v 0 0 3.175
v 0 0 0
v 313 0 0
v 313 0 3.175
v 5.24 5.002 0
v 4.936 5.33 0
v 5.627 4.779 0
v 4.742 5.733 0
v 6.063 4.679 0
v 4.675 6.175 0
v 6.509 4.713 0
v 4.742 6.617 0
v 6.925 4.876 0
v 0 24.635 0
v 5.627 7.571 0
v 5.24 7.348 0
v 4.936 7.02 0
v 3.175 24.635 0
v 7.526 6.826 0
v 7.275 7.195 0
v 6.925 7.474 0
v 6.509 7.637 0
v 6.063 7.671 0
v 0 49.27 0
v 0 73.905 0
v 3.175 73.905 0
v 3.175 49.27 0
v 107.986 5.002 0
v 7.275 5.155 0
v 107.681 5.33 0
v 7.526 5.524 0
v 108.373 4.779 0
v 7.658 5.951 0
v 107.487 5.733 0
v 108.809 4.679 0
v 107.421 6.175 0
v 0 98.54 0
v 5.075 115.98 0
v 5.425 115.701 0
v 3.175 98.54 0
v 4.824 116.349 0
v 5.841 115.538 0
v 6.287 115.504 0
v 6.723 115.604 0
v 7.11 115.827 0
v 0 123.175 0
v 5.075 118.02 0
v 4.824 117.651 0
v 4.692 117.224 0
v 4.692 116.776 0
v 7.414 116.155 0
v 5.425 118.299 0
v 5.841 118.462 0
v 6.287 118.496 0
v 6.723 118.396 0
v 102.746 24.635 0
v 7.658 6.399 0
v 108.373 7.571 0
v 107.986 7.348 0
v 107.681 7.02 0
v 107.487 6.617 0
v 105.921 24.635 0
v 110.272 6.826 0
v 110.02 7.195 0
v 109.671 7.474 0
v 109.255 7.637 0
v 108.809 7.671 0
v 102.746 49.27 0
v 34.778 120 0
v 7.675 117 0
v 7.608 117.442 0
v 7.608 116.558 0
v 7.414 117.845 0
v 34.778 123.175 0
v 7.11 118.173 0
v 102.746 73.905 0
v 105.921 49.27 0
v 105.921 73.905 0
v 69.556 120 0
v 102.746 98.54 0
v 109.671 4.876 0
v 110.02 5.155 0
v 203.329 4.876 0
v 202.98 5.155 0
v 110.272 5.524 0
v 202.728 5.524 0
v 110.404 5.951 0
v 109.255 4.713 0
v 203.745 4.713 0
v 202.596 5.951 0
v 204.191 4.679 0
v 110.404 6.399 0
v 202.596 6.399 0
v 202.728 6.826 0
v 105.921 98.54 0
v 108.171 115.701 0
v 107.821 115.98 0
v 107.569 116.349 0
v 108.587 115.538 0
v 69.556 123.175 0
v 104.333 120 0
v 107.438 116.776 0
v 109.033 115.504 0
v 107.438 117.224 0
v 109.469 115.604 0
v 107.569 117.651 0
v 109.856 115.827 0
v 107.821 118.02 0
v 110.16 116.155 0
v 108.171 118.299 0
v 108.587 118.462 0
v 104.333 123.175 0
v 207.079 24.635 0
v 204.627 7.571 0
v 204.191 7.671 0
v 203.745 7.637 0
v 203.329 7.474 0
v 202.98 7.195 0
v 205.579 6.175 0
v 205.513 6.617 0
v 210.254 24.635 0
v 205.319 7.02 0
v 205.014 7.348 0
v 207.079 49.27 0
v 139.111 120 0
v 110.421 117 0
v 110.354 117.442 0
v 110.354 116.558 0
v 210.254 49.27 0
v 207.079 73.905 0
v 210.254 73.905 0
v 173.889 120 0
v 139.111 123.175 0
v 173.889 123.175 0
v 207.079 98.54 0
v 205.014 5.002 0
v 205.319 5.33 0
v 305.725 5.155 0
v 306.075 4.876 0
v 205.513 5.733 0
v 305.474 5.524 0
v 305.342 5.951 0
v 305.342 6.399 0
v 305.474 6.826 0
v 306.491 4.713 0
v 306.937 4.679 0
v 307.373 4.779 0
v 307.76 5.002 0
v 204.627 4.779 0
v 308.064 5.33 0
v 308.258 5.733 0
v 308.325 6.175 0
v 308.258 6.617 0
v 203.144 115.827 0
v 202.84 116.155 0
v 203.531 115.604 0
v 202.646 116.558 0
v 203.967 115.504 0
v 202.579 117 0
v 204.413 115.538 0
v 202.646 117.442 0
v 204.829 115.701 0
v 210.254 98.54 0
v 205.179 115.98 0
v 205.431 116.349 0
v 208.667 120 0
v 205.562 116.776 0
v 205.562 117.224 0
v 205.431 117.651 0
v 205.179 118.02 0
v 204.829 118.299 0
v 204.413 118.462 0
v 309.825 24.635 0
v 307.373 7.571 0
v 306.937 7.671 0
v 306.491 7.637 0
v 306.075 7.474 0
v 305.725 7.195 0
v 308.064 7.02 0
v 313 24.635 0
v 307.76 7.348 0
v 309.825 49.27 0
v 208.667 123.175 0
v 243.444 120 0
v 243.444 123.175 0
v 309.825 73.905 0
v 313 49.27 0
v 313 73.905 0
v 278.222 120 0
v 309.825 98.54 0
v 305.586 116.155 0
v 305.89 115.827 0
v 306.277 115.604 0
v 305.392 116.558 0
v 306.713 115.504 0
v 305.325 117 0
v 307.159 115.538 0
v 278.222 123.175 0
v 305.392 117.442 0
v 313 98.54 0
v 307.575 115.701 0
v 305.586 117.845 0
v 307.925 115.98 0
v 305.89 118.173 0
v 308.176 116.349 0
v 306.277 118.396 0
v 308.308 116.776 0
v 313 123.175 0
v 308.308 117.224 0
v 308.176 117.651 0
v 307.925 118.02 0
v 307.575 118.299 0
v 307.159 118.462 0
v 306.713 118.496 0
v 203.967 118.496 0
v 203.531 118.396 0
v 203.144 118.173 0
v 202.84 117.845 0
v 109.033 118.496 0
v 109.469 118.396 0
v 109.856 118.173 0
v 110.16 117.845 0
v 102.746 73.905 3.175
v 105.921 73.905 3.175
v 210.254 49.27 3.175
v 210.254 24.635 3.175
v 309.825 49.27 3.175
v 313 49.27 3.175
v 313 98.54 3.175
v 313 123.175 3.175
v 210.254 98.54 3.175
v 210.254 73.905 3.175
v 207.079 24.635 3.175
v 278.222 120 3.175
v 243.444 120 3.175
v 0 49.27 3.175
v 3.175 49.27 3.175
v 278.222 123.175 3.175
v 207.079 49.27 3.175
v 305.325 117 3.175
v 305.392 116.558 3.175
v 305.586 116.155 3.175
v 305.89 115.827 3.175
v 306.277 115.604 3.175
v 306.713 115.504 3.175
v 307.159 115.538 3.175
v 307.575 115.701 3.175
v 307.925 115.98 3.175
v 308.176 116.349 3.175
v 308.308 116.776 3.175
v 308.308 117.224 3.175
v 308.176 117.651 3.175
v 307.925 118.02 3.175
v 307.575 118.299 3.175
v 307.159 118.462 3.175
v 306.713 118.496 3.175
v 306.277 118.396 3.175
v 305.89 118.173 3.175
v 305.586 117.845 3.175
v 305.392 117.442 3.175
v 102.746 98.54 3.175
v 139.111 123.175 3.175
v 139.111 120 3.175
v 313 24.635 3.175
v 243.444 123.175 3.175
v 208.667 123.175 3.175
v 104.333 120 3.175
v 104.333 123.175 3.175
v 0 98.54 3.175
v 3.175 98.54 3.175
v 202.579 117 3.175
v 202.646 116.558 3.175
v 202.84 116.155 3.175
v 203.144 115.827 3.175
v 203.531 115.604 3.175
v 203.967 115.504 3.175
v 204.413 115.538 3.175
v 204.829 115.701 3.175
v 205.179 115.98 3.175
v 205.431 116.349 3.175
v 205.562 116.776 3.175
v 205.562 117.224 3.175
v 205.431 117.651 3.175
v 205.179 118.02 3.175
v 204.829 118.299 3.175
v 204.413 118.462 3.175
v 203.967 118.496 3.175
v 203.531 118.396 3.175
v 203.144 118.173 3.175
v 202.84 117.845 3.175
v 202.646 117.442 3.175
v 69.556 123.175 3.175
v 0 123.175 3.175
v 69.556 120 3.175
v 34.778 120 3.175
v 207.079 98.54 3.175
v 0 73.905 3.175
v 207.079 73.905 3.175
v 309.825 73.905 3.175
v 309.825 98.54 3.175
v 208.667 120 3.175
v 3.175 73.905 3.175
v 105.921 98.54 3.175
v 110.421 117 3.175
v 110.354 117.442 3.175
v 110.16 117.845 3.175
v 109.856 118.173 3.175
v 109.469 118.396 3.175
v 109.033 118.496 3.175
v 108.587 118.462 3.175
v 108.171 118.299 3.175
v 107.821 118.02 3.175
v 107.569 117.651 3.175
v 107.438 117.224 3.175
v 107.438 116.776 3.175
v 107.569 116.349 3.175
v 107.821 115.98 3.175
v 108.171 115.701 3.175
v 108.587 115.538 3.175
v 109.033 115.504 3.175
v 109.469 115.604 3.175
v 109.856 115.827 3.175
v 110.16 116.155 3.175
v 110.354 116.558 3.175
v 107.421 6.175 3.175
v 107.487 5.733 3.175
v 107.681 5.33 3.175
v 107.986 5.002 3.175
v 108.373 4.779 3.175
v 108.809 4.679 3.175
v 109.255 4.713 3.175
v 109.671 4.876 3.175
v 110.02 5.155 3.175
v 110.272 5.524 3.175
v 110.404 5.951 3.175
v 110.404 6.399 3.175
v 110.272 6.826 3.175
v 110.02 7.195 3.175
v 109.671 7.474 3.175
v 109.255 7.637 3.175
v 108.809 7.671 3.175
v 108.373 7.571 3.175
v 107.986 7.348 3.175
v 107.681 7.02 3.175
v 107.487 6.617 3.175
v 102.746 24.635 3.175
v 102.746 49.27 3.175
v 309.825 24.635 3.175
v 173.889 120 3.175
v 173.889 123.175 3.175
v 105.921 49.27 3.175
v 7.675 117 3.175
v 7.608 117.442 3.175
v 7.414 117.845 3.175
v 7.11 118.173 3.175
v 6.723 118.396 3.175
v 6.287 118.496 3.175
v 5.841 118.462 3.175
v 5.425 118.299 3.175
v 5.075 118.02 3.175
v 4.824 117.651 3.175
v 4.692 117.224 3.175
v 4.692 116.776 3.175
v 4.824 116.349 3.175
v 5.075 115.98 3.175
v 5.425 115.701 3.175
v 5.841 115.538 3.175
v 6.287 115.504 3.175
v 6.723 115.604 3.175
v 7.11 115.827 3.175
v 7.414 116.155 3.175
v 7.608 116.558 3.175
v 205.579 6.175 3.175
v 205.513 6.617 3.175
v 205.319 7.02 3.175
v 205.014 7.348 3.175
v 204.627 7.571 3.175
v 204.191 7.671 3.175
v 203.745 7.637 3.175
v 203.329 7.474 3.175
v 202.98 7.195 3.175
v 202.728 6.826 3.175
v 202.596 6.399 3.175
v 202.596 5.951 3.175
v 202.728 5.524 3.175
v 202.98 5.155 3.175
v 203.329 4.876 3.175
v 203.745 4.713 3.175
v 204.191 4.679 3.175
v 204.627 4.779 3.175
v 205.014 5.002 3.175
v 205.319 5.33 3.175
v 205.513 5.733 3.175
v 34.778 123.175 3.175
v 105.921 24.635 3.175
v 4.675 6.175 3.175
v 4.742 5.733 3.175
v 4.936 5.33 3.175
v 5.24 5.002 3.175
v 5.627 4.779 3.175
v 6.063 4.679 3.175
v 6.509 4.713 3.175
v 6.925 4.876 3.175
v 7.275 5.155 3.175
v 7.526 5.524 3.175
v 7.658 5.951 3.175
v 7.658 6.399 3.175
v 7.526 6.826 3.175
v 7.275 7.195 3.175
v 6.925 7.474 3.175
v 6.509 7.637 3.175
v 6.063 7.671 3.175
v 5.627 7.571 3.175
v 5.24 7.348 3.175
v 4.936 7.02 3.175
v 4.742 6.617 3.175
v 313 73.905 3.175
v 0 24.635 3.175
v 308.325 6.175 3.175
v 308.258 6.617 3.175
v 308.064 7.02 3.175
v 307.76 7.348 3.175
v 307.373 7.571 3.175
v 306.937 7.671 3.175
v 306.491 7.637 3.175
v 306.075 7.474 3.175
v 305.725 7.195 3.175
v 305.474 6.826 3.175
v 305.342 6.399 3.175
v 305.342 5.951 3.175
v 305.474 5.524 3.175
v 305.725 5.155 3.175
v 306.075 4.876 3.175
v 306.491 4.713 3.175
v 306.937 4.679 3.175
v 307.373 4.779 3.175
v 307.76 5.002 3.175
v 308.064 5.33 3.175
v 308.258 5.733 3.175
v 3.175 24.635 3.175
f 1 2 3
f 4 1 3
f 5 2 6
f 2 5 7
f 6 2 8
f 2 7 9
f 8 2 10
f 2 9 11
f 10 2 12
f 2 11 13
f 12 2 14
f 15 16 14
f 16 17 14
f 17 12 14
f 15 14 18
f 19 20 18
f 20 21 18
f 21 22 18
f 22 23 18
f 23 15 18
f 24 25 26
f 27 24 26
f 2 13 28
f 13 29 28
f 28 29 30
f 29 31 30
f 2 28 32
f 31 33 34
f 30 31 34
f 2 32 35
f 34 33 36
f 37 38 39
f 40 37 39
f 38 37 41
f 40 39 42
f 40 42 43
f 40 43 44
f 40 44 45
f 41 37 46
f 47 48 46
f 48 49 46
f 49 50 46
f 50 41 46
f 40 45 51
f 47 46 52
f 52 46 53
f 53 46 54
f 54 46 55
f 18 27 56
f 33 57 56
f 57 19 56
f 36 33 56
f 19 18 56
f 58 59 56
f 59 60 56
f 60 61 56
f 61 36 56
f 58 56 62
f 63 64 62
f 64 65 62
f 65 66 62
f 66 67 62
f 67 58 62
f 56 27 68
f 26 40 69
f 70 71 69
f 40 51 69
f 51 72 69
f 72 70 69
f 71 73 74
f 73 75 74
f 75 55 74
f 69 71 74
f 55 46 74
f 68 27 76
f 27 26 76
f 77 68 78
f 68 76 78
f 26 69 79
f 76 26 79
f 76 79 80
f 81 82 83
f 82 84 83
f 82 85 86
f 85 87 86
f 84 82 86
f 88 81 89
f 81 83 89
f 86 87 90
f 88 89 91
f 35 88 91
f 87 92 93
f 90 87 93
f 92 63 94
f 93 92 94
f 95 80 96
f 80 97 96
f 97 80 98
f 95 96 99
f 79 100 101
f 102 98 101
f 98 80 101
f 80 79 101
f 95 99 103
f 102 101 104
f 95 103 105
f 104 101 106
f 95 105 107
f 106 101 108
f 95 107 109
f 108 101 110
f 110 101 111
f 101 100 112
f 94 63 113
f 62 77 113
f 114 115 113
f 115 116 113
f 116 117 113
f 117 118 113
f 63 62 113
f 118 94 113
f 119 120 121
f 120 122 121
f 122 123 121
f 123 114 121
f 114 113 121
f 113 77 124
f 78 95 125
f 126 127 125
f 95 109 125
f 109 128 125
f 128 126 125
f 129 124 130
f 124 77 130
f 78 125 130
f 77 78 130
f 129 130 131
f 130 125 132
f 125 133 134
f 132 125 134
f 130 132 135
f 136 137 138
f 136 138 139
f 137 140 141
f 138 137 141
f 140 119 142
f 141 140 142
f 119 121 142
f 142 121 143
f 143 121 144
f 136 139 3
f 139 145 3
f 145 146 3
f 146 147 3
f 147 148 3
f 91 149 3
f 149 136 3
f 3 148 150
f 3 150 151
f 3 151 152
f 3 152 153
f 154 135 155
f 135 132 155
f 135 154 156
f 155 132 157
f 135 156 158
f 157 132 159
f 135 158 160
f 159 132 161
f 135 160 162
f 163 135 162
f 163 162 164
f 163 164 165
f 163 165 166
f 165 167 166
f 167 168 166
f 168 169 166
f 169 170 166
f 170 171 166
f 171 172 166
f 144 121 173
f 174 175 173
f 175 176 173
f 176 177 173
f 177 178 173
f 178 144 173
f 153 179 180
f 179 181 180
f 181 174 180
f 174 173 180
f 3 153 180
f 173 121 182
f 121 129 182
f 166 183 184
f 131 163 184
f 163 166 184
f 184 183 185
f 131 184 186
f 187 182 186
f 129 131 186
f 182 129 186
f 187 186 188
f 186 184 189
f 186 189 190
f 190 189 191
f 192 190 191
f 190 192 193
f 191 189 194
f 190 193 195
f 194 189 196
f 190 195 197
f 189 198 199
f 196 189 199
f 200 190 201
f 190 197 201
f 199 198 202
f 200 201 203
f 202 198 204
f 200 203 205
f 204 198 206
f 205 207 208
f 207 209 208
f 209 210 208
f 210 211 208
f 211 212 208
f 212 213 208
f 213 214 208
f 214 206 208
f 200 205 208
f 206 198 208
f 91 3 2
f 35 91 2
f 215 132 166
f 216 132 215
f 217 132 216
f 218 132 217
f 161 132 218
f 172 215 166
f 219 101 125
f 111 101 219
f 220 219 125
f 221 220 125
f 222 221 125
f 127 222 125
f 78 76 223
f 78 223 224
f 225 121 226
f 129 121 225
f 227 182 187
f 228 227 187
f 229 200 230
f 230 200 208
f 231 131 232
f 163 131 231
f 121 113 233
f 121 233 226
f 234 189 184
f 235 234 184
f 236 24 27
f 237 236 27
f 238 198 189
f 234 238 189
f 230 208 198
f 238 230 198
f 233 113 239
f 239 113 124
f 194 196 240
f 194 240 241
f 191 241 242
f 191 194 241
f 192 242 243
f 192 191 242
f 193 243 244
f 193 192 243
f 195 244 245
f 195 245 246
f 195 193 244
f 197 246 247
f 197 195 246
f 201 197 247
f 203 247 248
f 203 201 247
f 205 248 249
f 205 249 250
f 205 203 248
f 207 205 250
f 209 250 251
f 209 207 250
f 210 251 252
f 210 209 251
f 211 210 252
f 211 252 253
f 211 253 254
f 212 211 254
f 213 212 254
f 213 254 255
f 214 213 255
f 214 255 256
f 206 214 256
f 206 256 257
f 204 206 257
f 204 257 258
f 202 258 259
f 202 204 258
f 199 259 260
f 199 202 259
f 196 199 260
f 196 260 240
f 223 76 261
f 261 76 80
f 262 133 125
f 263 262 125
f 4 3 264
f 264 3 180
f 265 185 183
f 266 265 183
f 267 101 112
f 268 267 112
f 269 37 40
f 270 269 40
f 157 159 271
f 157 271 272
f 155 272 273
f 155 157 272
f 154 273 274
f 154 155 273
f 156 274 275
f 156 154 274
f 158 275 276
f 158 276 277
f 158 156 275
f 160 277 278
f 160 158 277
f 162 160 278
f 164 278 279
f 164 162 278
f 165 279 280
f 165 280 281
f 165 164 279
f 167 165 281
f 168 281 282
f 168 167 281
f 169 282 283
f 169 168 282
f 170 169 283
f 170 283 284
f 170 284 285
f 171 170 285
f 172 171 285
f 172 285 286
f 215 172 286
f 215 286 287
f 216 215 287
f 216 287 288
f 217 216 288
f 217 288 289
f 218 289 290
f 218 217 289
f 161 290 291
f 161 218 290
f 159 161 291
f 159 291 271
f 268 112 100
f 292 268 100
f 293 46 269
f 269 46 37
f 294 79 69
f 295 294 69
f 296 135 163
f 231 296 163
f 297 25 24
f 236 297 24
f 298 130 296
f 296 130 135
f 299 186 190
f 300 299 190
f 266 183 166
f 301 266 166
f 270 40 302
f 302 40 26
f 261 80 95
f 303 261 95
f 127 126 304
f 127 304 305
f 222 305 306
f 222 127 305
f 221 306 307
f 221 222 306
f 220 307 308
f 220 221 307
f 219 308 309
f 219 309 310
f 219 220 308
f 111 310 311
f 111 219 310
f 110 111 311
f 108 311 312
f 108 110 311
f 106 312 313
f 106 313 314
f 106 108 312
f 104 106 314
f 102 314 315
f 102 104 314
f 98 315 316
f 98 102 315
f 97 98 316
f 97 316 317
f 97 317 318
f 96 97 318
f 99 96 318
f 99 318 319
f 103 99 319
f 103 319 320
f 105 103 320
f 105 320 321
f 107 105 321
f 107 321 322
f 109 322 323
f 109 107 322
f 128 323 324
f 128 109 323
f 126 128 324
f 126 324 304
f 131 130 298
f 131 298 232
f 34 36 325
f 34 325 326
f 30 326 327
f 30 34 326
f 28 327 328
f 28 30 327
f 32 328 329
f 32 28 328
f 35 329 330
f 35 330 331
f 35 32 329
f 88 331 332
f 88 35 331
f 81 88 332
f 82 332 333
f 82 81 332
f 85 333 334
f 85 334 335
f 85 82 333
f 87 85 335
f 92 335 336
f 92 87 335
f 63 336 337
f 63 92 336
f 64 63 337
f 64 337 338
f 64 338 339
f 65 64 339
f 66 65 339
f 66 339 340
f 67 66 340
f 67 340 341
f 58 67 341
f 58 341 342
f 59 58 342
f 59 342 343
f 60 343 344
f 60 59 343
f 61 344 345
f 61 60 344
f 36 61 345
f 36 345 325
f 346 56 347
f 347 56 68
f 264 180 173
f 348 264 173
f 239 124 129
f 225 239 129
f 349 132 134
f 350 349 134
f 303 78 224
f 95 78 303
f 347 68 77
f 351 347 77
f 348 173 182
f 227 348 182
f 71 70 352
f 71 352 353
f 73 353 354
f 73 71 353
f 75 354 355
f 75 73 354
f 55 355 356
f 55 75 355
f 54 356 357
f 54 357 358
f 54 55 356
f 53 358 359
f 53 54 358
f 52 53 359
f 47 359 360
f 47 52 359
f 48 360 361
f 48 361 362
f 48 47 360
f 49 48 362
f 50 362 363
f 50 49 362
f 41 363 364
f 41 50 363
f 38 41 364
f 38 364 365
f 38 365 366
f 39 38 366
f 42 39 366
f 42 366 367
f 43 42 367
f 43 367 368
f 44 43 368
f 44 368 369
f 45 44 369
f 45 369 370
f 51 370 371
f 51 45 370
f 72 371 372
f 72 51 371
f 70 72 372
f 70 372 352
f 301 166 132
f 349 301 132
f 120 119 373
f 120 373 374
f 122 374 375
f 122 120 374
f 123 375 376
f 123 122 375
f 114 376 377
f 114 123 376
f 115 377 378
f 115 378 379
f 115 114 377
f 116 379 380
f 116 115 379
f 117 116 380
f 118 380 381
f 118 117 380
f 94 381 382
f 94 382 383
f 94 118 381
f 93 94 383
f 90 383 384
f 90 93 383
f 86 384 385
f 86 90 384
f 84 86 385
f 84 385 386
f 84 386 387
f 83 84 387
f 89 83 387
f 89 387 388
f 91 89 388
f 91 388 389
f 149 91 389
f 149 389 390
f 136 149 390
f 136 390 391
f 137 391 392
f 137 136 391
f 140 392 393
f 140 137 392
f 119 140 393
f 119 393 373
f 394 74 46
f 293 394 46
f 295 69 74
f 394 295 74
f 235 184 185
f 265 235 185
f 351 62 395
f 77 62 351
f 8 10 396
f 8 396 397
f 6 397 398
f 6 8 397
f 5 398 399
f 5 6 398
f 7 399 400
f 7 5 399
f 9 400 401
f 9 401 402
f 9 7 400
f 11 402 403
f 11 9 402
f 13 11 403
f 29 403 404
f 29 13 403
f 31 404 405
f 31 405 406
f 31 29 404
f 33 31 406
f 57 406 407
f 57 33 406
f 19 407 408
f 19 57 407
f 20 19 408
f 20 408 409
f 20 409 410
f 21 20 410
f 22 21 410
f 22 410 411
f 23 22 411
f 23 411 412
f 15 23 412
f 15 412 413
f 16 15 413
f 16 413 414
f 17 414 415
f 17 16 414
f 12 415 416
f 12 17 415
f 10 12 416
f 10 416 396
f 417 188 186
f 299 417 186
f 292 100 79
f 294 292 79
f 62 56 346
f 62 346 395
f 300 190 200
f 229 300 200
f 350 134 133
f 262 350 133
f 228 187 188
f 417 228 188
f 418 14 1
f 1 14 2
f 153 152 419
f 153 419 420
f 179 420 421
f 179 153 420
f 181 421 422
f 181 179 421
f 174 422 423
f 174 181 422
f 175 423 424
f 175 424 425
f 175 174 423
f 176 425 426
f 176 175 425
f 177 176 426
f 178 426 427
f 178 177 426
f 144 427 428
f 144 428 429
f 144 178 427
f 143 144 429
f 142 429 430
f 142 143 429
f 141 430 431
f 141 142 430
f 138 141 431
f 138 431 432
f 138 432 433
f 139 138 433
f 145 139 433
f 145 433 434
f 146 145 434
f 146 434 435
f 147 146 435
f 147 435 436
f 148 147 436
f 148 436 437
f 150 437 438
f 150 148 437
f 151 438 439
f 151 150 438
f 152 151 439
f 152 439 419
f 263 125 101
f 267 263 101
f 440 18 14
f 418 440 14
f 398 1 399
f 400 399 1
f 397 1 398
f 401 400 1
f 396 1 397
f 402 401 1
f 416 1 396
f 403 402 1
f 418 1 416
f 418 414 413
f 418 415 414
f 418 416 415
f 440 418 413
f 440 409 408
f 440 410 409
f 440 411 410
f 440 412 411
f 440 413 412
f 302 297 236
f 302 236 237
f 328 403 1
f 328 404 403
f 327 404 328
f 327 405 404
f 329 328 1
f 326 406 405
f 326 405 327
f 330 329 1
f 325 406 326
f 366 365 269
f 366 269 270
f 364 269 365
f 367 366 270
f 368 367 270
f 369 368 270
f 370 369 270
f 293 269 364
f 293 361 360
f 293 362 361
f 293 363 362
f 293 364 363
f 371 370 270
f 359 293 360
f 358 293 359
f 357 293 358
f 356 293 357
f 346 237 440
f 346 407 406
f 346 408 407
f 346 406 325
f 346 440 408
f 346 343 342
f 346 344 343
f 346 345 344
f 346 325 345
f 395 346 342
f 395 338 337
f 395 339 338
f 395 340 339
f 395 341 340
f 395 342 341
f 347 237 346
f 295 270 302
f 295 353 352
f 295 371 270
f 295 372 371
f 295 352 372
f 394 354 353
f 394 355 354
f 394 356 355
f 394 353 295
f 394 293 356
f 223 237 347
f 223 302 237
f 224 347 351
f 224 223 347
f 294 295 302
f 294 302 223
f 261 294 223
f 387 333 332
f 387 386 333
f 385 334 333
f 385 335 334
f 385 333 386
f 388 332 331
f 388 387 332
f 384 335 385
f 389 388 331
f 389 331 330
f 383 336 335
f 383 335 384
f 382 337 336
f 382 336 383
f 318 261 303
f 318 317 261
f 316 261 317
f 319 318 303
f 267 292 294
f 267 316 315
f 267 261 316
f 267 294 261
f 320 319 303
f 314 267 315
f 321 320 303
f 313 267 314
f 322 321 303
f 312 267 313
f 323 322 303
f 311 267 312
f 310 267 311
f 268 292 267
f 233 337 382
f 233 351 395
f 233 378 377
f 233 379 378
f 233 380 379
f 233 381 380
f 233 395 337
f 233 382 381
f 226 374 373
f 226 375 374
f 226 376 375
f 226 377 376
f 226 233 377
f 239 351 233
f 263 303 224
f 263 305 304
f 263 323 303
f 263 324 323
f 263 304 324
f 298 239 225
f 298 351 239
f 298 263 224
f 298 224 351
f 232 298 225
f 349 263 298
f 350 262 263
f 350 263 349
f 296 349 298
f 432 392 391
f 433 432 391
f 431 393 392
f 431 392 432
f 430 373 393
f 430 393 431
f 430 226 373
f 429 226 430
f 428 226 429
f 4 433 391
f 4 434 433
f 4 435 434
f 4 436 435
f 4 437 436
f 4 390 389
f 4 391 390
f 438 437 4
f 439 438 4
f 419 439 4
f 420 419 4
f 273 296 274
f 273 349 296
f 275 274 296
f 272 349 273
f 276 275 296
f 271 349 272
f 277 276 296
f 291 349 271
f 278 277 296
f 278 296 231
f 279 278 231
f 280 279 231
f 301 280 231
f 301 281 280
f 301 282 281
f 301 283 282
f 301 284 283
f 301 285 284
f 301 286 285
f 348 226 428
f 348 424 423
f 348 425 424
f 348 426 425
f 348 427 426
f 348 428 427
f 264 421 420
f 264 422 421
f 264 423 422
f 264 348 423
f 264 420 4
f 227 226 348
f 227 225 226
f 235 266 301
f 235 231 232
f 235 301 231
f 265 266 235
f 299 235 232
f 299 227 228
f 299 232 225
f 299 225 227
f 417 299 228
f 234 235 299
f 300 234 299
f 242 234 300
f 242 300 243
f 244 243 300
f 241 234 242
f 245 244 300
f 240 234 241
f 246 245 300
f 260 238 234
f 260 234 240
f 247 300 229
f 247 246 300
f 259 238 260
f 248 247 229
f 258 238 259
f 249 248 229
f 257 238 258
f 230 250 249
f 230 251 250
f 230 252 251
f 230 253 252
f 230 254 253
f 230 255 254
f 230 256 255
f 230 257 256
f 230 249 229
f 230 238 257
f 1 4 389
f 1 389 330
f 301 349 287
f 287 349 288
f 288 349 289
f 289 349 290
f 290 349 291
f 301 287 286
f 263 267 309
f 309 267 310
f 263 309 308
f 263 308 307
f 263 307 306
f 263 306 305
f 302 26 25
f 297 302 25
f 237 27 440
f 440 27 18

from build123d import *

# Parameters (mm, degrees)
SKETCH1_R           = 1.5
SKETCH1_W           = 3.175
SKETCH1_H           = 24.635
BOSS_EXTRUDE1_DEPTH = 3.175


with BuildPart() as part:
    # Sketch1 → Boss-Extrude1 (new body)
    with BuildSketch(Plane.XY):
        Polygon((0, 0), (313, 0), (313, 24.635), (309.825, 24.635), (309.825, 49.27), (313, 49.27), (313, 73.905), (309.825, 73.905), (309.825, 98.54), (313, 98.54), (313, 123.175), (278.222222222, 123.175), (278.222222222, 120), (243.444444444, 120), (243.444444444, 123.175), (208.666666667, 123.175), (208.666666667, 120), (173.888888889, 120), (173.888888889, 123.175), (139.111111111, 123.175), (139.111111111, 120), (104.333333333, 120), (104.333333333, 123.175), (69.555555556, 123.175), (69.555555556, 120), (34.777777778, 120), (34.777777778, 123.175), (0, 123.175), (0, 98.54), (3.175, 98.54), (3.175, 73.905), (0, 73.905), (0, 49.27), (3.175, 49.27), (3.175, 24.635), (0, 24.635), align=None)
        with Locations((6.175, 117)):
            Circle(SKETCH1_R, mode=Mode.SUBTRACT)
        with Locations((108.920833333, 117)):
            Circle(SKETCH1_R, mode=Mode.SUBTRACT)
        with Locations(Location((108.920833333, 6.175, 0), (0, 0, 180))):
            Circle(SKETCH1_R, mode=Mode.SUBTRACT)
        with Locations(Location((6.175, 6.175, 0), (0, 0, 180))):
            Circle(SKETCH1_R, mode=Mode.SUBTRACT)
        with Locations((306.825, 6.175)):
            Circle(SKETCH1_R, mode=Mode.SUBTRACT)
        with Locations((204.079166667, 6.175)):
            Circle(SKETCH1_R, mode=Mode.SUBTRACT)
        with Locations(Location((204.079166667, 117, 0), (0, 0, 180))):
            Circle(SKETCH1_R, mode=Mode.SUBTRACT)
        with Locations(Location((306.825, 117, 0), (0, 0, 180))):
            Circle(SKETCH1_R, mode=Mode.SUBTRACT)
        with Locations((104.333333333, 86.2225)):
            Rectangle(SKETCH1_W, SKETCH1_H, mode=Mode.SUBTRACT)
        with Locations((104.333333333, 36.9525)):
            Rectangle(SKETCH1_W, SKETCH1_H, mode=Mode.SUBTRACT)
        with Locations((208.666666667, 86.2225)):
            Rectangle(SKETCH1_W, SKETCH1_H, mode=Mode.SUBTRACT)
        with Locations((208.666666667, 36.9525)):
            Rectangle(SKETCH1_W, SKETCH1_H, mode=Mode.SUBTRACT)
    extrude(amount=BOSS_EXTRUDE1_DEPTH)


solid = part.part
